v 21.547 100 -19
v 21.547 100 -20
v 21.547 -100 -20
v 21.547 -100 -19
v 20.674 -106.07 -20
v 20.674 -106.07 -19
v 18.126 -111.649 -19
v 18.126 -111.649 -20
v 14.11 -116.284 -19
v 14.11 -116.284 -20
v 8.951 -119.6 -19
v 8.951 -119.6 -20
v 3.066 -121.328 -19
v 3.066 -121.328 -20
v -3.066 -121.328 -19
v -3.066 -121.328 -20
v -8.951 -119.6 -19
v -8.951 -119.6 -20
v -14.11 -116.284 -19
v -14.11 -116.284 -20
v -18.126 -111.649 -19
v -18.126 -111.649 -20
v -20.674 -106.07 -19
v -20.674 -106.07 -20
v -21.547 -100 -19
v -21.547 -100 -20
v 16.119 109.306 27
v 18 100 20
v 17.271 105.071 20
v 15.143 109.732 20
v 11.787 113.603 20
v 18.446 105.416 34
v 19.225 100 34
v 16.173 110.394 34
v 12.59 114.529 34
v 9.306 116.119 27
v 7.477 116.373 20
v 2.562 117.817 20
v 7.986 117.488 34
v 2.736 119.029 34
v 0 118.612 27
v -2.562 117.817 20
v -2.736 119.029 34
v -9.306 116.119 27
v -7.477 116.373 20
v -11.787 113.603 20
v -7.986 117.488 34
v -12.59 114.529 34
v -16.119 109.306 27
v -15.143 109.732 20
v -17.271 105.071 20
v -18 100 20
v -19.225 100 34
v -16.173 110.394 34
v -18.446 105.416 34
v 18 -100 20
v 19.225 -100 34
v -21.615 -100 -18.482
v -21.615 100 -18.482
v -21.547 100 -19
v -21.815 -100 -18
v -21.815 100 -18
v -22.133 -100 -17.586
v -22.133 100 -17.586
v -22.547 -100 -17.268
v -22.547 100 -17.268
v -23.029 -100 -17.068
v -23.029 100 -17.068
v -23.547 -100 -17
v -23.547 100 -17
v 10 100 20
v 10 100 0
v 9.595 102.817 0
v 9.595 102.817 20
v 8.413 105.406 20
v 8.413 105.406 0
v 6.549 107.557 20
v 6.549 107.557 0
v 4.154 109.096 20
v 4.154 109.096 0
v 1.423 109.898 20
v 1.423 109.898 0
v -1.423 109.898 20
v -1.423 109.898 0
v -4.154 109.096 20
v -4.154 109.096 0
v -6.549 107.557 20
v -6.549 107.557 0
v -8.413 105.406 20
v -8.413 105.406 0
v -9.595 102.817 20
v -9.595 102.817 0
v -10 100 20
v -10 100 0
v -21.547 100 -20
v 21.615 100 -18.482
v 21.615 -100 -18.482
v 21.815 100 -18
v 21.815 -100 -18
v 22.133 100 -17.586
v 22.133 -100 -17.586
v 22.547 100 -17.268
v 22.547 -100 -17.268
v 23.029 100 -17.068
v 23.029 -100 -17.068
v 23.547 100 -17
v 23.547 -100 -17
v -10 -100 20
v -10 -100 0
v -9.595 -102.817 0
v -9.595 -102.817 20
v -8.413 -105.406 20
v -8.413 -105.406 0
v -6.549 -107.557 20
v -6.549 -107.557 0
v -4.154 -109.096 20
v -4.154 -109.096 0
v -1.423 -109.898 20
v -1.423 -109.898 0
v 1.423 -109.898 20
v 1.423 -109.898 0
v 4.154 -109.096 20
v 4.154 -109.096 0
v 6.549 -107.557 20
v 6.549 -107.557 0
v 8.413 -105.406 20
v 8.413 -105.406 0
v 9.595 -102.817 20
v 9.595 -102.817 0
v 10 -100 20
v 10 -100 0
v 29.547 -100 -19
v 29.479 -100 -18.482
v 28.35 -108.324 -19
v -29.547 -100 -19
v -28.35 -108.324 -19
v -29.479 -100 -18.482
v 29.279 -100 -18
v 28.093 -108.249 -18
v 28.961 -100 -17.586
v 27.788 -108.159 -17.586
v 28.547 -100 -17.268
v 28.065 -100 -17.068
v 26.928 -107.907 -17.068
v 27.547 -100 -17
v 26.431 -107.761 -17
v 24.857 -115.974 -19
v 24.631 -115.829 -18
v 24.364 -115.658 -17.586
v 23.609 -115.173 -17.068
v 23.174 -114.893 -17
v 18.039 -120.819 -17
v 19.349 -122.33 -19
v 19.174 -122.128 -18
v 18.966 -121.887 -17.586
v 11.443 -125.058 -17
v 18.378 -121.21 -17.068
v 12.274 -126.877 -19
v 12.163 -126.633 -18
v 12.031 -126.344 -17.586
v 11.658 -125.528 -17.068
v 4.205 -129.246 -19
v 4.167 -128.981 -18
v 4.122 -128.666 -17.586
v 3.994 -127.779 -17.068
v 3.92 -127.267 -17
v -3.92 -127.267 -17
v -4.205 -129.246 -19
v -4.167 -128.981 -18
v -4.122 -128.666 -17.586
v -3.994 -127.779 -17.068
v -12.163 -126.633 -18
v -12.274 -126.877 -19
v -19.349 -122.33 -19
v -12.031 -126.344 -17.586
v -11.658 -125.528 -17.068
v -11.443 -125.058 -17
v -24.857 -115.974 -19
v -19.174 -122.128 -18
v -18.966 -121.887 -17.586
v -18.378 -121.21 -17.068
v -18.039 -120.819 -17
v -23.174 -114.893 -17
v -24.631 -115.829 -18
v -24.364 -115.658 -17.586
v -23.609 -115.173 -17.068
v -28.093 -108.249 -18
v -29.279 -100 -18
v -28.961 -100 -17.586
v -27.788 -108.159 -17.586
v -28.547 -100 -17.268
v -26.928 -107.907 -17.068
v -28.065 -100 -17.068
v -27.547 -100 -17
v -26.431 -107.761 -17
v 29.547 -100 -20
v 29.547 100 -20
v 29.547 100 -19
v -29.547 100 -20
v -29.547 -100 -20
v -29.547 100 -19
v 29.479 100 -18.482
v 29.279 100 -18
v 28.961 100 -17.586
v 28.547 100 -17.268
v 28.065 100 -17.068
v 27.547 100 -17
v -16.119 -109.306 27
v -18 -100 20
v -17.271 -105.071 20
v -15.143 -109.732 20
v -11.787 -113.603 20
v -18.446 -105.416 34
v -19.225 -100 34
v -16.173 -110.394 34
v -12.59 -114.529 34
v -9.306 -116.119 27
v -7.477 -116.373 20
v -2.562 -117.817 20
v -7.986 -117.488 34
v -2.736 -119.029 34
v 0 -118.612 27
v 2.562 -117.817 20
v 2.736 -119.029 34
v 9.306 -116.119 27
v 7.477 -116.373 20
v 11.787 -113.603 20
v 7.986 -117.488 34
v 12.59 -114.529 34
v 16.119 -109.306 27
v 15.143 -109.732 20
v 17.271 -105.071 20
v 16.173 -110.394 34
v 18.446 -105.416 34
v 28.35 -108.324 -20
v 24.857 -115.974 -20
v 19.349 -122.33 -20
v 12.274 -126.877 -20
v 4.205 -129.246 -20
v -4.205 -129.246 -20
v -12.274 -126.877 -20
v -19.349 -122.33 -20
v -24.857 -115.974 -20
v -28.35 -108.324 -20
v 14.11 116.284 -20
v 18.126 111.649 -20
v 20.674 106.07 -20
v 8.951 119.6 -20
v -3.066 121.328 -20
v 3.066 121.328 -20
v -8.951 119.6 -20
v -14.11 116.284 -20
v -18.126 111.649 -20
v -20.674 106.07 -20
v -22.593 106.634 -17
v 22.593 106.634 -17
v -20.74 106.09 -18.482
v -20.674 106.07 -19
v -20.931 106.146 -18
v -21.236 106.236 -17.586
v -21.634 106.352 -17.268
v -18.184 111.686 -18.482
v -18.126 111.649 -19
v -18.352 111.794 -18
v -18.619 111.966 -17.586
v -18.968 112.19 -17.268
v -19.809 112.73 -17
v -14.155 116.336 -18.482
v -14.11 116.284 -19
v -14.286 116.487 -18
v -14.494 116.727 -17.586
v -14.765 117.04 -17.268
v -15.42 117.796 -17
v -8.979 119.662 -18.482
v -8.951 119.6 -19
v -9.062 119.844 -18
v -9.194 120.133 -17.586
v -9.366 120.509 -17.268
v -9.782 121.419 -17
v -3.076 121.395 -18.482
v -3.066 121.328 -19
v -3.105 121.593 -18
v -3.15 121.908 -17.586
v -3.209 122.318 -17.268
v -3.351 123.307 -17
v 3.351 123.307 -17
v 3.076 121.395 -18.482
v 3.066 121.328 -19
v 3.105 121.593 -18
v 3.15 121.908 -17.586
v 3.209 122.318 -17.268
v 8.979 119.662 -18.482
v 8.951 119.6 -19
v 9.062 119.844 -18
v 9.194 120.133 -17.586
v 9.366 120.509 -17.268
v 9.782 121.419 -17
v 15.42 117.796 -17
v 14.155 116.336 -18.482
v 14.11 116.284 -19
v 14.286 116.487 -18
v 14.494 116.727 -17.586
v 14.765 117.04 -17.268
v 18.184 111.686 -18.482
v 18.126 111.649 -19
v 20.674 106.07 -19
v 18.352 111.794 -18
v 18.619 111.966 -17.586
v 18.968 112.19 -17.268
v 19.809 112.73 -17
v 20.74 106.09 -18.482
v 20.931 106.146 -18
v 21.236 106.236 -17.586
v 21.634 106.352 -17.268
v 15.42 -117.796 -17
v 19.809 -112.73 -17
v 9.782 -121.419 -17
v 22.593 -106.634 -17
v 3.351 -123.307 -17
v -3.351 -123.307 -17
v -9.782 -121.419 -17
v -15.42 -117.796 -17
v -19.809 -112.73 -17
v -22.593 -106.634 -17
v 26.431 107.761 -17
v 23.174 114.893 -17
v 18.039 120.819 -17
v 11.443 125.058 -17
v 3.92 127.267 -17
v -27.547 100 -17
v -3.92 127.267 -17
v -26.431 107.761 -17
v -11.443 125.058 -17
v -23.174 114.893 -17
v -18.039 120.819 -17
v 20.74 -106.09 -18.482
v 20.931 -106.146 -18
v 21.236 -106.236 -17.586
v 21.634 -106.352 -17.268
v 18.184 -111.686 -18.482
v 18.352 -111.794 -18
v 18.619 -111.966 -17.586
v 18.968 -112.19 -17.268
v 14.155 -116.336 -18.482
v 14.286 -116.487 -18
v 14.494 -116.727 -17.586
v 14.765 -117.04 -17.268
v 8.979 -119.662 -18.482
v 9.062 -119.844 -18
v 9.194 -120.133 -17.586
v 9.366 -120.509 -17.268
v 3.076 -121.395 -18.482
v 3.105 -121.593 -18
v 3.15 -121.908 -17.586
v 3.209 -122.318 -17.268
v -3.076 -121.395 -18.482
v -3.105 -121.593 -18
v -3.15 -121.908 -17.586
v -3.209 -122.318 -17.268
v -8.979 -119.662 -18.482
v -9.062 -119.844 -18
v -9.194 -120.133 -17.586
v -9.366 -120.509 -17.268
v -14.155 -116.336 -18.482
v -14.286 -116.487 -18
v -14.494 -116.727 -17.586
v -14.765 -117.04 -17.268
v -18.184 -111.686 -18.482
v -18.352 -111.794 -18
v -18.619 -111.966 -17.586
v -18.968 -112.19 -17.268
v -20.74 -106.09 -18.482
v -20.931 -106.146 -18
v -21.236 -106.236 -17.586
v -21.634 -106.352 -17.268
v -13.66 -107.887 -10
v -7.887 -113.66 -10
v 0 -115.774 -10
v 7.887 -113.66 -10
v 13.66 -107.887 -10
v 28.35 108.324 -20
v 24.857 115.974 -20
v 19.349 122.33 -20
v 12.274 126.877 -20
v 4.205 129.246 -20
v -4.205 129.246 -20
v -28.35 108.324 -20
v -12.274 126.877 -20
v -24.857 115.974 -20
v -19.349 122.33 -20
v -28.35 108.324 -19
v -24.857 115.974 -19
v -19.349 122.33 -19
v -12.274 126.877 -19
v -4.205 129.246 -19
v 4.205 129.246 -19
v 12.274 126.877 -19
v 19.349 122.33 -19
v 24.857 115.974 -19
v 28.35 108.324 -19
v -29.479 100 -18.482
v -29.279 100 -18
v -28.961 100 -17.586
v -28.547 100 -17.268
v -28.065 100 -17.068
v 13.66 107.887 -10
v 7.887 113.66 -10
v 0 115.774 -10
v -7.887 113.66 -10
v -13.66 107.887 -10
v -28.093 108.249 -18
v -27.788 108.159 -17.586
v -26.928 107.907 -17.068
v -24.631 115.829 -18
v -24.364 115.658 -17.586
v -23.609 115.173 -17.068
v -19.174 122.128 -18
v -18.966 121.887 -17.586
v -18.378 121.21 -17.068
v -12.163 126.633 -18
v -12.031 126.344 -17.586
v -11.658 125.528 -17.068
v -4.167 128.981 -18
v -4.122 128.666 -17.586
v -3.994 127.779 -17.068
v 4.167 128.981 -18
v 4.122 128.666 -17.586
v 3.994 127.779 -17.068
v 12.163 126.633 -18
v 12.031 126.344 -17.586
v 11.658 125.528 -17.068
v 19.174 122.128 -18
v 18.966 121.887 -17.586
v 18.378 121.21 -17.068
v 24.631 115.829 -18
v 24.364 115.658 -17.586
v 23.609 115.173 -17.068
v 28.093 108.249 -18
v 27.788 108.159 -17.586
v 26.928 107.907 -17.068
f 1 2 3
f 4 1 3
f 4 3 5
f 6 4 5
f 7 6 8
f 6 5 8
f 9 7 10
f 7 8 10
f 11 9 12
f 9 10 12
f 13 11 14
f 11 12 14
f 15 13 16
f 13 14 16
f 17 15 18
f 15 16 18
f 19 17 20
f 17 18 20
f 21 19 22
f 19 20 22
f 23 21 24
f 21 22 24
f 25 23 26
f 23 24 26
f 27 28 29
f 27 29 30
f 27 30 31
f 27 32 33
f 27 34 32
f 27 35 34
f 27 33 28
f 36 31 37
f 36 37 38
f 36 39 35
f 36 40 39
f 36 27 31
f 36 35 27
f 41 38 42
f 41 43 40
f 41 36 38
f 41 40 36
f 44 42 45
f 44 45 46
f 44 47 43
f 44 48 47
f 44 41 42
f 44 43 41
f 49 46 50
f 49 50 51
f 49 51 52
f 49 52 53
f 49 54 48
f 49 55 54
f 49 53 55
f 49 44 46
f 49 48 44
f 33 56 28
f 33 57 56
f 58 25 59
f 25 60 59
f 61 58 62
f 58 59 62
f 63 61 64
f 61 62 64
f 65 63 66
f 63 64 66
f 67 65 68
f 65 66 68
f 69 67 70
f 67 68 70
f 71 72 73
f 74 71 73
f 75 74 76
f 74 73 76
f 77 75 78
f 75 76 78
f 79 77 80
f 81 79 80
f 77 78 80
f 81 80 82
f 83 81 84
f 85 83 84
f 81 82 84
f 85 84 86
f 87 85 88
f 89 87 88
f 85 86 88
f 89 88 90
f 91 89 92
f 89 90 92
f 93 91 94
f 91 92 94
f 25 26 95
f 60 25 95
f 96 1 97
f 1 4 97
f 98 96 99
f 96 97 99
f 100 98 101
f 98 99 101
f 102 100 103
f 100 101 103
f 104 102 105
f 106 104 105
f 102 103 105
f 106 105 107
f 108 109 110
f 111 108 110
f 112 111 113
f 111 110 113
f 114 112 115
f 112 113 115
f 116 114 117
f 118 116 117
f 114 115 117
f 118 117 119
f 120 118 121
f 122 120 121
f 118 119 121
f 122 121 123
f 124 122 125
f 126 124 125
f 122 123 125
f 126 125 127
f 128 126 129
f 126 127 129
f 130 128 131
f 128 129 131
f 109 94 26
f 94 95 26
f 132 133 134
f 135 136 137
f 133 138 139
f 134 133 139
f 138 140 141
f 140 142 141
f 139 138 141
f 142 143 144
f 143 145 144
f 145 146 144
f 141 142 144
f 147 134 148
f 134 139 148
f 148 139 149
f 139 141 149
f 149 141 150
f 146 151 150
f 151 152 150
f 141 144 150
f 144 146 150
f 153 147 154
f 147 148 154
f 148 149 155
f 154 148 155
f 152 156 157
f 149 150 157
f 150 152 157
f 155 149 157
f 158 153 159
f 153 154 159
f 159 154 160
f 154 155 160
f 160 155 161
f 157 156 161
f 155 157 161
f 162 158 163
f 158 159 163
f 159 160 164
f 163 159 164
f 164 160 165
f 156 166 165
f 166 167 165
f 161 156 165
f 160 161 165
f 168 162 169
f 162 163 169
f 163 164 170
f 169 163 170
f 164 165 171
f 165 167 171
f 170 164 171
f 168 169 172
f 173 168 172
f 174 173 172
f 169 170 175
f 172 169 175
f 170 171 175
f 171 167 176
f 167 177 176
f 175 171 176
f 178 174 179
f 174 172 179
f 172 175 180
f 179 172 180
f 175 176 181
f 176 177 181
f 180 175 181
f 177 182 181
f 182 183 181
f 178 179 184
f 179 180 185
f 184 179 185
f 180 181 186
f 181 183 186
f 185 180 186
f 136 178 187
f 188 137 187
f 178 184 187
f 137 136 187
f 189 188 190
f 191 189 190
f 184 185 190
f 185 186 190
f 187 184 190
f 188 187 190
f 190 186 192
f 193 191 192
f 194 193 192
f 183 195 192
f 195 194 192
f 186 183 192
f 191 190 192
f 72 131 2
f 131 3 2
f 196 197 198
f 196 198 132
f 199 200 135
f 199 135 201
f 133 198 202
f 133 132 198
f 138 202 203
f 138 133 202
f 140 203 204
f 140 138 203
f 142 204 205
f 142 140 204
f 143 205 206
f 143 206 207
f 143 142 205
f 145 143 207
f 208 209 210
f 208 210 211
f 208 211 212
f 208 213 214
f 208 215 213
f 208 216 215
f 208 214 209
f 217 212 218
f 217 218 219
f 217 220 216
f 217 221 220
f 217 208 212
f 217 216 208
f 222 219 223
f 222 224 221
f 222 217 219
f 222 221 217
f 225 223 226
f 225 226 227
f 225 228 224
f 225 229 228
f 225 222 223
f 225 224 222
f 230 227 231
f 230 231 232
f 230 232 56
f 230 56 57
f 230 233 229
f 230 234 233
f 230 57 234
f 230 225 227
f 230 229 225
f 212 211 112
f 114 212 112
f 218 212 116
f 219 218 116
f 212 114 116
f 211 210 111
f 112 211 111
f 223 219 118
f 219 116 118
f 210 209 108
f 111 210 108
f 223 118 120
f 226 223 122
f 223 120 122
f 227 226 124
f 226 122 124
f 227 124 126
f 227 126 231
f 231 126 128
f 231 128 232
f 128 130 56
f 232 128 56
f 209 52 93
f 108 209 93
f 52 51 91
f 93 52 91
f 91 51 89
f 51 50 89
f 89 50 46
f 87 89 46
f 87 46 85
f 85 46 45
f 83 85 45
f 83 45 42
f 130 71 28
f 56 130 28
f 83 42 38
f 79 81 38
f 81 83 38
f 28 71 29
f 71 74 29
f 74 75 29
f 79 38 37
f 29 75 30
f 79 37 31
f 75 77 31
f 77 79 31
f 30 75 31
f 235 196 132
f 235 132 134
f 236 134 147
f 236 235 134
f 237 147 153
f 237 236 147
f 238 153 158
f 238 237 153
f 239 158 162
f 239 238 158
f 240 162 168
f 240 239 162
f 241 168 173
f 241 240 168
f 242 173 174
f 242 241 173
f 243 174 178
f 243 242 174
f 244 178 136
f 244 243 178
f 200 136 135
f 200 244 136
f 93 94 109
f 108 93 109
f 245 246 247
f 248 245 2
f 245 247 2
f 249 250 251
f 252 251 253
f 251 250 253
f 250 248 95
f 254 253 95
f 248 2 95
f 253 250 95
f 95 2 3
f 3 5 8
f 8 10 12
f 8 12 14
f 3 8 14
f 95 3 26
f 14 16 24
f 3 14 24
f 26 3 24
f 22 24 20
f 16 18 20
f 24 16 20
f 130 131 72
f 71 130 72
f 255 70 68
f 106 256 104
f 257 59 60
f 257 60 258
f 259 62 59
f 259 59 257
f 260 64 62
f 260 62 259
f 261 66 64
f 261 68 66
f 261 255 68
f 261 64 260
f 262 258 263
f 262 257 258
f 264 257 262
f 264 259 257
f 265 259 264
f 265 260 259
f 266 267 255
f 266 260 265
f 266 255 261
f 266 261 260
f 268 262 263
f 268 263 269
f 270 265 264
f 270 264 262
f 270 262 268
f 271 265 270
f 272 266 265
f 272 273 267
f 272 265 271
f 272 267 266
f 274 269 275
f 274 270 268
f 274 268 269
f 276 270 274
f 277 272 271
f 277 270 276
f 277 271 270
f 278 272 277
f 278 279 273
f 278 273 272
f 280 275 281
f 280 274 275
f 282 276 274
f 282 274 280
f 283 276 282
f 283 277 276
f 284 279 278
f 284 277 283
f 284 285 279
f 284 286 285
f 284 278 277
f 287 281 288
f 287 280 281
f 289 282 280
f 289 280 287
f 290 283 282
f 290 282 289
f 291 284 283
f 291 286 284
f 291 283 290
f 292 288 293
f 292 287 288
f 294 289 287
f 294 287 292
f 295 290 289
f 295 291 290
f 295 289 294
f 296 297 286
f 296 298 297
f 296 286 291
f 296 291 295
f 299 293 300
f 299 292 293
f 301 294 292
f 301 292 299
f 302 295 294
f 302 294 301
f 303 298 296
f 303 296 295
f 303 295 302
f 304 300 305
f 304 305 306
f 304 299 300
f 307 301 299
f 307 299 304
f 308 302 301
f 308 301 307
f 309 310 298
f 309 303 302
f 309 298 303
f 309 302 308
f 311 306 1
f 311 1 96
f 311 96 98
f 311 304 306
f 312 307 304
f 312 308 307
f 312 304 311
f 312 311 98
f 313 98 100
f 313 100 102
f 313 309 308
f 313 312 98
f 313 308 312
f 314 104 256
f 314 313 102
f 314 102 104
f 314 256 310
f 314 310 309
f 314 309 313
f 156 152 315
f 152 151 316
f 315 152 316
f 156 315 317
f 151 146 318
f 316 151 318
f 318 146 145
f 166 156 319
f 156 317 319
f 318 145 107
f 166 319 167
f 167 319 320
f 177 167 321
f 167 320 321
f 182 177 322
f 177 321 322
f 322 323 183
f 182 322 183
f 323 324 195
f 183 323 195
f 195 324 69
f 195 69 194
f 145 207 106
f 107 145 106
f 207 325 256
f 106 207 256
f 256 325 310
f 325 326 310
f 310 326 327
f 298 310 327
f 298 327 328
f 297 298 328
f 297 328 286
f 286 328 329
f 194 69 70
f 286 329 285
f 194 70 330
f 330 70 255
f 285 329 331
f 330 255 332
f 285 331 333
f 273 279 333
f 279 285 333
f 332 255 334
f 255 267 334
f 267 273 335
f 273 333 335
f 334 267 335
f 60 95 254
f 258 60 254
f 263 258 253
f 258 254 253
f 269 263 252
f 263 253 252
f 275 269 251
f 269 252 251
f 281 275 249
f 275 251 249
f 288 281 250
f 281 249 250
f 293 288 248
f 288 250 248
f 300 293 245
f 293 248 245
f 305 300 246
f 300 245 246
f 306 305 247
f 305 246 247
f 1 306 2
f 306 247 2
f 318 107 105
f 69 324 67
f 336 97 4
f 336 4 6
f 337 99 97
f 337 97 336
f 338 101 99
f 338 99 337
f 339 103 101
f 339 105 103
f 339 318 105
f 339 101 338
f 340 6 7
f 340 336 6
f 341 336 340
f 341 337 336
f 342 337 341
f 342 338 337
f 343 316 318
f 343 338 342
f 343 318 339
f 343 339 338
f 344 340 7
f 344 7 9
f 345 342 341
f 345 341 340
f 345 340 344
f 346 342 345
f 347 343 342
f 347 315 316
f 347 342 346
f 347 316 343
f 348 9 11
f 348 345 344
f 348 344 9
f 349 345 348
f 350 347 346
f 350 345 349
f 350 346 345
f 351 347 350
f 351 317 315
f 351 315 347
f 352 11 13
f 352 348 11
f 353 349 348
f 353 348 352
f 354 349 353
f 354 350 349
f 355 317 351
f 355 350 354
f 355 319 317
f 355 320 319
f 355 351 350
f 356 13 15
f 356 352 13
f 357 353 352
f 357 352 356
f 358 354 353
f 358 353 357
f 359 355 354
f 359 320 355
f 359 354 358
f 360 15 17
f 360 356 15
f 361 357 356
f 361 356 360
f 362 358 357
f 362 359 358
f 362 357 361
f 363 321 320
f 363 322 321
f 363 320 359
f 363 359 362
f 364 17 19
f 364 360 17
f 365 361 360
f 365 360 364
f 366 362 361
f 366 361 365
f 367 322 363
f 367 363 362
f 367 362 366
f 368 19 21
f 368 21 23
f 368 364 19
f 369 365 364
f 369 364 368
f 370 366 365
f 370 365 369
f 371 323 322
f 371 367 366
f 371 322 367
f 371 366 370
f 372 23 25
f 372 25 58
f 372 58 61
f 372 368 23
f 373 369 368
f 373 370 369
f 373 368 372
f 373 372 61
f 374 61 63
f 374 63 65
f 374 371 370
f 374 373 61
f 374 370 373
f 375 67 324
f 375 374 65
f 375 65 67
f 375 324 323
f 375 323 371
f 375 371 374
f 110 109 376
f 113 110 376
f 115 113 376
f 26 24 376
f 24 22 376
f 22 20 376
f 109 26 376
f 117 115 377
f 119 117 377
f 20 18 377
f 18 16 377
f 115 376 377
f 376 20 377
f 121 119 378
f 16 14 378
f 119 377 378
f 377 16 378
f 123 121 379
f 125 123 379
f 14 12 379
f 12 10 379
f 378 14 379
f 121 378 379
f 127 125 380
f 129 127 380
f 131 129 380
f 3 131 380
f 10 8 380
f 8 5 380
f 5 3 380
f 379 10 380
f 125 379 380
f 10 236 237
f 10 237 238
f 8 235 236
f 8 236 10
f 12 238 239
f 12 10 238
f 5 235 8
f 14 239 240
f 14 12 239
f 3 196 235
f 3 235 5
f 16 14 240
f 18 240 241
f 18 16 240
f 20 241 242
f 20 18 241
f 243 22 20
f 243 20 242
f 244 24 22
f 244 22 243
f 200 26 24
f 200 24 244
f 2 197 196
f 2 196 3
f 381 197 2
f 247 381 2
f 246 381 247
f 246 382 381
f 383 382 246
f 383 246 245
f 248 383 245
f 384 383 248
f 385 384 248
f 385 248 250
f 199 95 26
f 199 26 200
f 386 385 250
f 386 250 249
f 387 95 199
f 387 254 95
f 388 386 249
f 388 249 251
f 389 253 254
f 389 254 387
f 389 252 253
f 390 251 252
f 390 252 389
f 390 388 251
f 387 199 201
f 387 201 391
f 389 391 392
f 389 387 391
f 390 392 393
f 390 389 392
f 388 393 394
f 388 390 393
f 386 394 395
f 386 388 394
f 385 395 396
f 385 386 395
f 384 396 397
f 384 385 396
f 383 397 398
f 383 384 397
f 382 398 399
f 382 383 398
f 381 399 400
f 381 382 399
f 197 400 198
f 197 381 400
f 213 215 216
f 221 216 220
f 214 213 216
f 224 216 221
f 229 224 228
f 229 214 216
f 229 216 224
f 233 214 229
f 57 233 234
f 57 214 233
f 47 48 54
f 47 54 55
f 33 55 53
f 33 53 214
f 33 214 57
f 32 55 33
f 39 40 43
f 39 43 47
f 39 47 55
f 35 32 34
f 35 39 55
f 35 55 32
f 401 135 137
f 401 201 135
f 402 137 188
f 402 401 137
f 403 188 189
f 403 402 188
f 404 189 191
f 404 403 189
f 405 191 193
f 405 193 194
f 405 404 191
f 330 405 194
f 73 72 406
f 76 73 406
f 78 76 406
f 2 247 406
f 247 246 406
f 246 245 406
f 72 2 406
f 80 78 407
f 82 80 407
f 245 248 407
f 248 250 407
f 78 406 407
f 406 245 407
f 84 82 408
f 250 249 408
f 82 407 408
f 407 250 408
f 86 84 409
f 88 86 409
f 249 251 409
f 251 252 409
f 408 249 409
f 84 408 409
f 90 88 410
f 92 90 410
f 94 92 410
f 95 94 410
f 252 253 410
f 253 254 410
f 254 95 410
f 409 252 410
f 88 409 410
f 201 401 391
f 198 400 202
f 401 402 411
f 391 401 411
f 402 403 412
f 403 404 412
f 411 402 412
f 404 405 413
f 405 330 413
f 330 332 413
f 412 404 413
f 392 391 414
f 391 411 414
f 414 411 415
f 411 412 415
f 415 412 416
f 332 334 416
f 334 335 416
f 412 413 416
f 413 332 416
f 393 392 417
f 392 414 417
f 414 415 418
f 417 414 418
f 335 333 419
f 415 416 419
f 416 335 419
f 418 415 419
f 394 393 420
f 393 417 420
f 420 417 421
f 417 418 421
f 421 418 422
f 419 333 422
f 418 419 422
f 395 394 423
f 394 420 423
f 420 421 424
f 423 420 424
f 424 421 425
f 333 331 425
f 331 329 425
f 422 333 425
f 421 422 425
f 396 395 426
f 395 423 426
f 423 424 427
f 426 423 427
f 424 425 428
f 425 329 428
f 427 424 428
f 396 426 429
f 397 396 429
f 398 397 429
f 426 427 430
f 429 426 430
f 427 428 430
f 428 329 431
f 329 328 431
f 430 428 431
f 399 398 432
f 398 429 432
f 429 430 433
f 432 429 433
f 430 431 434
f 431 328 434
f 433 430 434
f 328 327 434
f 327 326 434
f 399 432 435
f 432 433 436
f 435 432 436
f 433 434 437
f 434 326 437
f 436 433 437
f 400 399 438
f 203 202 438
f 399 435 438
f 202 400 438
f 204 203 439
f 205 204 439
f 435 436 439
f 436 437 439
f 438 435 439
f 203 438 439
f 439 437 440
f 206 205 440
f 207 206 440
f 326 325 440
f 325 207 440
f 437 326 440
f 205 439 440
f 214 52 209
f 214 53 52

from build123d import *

# Parameters (mm, degrees)
BOSS_EXTRUDE1_DEPTH           = 20
BOSS_EXTRUDE1_OTHER_WAY_DEPTH = 20
BOSS_EXTRUDE1_OTHER_WAY_TAPER = -30
BOSS_EXTRUDE2_DEPTH           = 3
FILLET1_R                     = 2
BOSS_EXTRUDE4_DEPTH           = 14
BOSS_EXTRUDE4_TAPER           = -5


with BuildPart() as part:
    # Sketch1 → Boss-Extrude1 (new body)
    with BuildSketch(Plane.XY):
        with BuildLine():
            ThreePointArc((-10, -100), (0, -110), (10, -100))
            Line((10, -100), (10, 100))
            ThreePointArc((10, 100), (0, 110), (-10, 100))
            Line((-10, 100), (-10, -100))
        make_face()
    extrude(amount=BOSS_EXTRUDE1_DEPTH)

    # Sketch1 → Boss-Extrude1 other way (add)
    with BuildSketch(Plane.XY):
        with BuildLine():
            ThreePointArc((-10, -100), (0, -110), (10, -100))
            Line((10, -100), (10, 100))
            ThreePointArc((10, 100), (0, 110), (-10, 100))
            Line((-10, 100), (-10, -100))
        make_face()
    extrude(amount=-BOSS_EXTRUDE1_OTHER_WAY_DEPTH, taper=BOSS_EXTRUDE1_OTHER_WAY_TAPER)

    # Sketch3 → Boss-Extrude4 (add)
    with BuildSketch(Plane.XY.offset(20)):
        with BuildLine():
            Line((18, -100), (18, 100))
            ThreePointArc((18, 100), (0, 118), (-18, 100))
            Line((-18, 100), (-18, -100))
            ThreePointArc((-18, -100), (0, -118), (18, -100))
        make_face()
    extrude(amount=BOSS_EXTRUDE4_DEPTH, taper=BOSS_EXTRUDE4_TAPER)


with BuildPart() as body_2:
    # Sketch2 → Boss-Extrude2 (new body)
    with BuildSketch(Plane(origin=(0, 0, -20), x_dir=(-1, 0, 0), z_dir=(0, 0, -1))):
        with BuildLine():
            Line((-29.547005384, 100), (-29.547005384, -100))
            ThreePointArc((-29.547005384, -100), (0, -129.547005384), (29.547005384, -100))
            Line((29.547005384, -100), (29.547005384, 100))
            ThreePointArc((29.547005384, 100), (0, 129.547005384), (-29.547005384, 100))
        make_face()
        with BuildLine():
            Line((21.547005384, -100), (21.547005384, 100))
            ThreePointArc((21.547005384, 100), (0, 121.547005384), (-21.547005384, 100))
            Line((-21.547005384, 100), (-21.547005384, -100))
            ThreePointArc((-21.547005384, -100), (0, -121.547005384), (21.547005384, -100))
        make_face(mode=Mode.SUBTRACT)
    extrude(amount=-BOSS_EXTRUDE2_DEPTH)

    # Fillet1
    fillet1_edges = [body_2.edges().sort_by_distance(p)[0] for p in [
        (0, -129.547005384, -17),
        (-29.547005384, 0, -17),
        (0, -121.547005384, -17),
        (21.547005384, 0, -17),
        (0, 121.547005384, -17),
        (-21.547005384, 0, -17),
        (0, 129.547005384, -17),
        (29.547005384, 0, -17),
    ]]
    fillet(fillet1_edges, radius=FILLET1_R)


solid = Compound([part.part, body_2.part])
